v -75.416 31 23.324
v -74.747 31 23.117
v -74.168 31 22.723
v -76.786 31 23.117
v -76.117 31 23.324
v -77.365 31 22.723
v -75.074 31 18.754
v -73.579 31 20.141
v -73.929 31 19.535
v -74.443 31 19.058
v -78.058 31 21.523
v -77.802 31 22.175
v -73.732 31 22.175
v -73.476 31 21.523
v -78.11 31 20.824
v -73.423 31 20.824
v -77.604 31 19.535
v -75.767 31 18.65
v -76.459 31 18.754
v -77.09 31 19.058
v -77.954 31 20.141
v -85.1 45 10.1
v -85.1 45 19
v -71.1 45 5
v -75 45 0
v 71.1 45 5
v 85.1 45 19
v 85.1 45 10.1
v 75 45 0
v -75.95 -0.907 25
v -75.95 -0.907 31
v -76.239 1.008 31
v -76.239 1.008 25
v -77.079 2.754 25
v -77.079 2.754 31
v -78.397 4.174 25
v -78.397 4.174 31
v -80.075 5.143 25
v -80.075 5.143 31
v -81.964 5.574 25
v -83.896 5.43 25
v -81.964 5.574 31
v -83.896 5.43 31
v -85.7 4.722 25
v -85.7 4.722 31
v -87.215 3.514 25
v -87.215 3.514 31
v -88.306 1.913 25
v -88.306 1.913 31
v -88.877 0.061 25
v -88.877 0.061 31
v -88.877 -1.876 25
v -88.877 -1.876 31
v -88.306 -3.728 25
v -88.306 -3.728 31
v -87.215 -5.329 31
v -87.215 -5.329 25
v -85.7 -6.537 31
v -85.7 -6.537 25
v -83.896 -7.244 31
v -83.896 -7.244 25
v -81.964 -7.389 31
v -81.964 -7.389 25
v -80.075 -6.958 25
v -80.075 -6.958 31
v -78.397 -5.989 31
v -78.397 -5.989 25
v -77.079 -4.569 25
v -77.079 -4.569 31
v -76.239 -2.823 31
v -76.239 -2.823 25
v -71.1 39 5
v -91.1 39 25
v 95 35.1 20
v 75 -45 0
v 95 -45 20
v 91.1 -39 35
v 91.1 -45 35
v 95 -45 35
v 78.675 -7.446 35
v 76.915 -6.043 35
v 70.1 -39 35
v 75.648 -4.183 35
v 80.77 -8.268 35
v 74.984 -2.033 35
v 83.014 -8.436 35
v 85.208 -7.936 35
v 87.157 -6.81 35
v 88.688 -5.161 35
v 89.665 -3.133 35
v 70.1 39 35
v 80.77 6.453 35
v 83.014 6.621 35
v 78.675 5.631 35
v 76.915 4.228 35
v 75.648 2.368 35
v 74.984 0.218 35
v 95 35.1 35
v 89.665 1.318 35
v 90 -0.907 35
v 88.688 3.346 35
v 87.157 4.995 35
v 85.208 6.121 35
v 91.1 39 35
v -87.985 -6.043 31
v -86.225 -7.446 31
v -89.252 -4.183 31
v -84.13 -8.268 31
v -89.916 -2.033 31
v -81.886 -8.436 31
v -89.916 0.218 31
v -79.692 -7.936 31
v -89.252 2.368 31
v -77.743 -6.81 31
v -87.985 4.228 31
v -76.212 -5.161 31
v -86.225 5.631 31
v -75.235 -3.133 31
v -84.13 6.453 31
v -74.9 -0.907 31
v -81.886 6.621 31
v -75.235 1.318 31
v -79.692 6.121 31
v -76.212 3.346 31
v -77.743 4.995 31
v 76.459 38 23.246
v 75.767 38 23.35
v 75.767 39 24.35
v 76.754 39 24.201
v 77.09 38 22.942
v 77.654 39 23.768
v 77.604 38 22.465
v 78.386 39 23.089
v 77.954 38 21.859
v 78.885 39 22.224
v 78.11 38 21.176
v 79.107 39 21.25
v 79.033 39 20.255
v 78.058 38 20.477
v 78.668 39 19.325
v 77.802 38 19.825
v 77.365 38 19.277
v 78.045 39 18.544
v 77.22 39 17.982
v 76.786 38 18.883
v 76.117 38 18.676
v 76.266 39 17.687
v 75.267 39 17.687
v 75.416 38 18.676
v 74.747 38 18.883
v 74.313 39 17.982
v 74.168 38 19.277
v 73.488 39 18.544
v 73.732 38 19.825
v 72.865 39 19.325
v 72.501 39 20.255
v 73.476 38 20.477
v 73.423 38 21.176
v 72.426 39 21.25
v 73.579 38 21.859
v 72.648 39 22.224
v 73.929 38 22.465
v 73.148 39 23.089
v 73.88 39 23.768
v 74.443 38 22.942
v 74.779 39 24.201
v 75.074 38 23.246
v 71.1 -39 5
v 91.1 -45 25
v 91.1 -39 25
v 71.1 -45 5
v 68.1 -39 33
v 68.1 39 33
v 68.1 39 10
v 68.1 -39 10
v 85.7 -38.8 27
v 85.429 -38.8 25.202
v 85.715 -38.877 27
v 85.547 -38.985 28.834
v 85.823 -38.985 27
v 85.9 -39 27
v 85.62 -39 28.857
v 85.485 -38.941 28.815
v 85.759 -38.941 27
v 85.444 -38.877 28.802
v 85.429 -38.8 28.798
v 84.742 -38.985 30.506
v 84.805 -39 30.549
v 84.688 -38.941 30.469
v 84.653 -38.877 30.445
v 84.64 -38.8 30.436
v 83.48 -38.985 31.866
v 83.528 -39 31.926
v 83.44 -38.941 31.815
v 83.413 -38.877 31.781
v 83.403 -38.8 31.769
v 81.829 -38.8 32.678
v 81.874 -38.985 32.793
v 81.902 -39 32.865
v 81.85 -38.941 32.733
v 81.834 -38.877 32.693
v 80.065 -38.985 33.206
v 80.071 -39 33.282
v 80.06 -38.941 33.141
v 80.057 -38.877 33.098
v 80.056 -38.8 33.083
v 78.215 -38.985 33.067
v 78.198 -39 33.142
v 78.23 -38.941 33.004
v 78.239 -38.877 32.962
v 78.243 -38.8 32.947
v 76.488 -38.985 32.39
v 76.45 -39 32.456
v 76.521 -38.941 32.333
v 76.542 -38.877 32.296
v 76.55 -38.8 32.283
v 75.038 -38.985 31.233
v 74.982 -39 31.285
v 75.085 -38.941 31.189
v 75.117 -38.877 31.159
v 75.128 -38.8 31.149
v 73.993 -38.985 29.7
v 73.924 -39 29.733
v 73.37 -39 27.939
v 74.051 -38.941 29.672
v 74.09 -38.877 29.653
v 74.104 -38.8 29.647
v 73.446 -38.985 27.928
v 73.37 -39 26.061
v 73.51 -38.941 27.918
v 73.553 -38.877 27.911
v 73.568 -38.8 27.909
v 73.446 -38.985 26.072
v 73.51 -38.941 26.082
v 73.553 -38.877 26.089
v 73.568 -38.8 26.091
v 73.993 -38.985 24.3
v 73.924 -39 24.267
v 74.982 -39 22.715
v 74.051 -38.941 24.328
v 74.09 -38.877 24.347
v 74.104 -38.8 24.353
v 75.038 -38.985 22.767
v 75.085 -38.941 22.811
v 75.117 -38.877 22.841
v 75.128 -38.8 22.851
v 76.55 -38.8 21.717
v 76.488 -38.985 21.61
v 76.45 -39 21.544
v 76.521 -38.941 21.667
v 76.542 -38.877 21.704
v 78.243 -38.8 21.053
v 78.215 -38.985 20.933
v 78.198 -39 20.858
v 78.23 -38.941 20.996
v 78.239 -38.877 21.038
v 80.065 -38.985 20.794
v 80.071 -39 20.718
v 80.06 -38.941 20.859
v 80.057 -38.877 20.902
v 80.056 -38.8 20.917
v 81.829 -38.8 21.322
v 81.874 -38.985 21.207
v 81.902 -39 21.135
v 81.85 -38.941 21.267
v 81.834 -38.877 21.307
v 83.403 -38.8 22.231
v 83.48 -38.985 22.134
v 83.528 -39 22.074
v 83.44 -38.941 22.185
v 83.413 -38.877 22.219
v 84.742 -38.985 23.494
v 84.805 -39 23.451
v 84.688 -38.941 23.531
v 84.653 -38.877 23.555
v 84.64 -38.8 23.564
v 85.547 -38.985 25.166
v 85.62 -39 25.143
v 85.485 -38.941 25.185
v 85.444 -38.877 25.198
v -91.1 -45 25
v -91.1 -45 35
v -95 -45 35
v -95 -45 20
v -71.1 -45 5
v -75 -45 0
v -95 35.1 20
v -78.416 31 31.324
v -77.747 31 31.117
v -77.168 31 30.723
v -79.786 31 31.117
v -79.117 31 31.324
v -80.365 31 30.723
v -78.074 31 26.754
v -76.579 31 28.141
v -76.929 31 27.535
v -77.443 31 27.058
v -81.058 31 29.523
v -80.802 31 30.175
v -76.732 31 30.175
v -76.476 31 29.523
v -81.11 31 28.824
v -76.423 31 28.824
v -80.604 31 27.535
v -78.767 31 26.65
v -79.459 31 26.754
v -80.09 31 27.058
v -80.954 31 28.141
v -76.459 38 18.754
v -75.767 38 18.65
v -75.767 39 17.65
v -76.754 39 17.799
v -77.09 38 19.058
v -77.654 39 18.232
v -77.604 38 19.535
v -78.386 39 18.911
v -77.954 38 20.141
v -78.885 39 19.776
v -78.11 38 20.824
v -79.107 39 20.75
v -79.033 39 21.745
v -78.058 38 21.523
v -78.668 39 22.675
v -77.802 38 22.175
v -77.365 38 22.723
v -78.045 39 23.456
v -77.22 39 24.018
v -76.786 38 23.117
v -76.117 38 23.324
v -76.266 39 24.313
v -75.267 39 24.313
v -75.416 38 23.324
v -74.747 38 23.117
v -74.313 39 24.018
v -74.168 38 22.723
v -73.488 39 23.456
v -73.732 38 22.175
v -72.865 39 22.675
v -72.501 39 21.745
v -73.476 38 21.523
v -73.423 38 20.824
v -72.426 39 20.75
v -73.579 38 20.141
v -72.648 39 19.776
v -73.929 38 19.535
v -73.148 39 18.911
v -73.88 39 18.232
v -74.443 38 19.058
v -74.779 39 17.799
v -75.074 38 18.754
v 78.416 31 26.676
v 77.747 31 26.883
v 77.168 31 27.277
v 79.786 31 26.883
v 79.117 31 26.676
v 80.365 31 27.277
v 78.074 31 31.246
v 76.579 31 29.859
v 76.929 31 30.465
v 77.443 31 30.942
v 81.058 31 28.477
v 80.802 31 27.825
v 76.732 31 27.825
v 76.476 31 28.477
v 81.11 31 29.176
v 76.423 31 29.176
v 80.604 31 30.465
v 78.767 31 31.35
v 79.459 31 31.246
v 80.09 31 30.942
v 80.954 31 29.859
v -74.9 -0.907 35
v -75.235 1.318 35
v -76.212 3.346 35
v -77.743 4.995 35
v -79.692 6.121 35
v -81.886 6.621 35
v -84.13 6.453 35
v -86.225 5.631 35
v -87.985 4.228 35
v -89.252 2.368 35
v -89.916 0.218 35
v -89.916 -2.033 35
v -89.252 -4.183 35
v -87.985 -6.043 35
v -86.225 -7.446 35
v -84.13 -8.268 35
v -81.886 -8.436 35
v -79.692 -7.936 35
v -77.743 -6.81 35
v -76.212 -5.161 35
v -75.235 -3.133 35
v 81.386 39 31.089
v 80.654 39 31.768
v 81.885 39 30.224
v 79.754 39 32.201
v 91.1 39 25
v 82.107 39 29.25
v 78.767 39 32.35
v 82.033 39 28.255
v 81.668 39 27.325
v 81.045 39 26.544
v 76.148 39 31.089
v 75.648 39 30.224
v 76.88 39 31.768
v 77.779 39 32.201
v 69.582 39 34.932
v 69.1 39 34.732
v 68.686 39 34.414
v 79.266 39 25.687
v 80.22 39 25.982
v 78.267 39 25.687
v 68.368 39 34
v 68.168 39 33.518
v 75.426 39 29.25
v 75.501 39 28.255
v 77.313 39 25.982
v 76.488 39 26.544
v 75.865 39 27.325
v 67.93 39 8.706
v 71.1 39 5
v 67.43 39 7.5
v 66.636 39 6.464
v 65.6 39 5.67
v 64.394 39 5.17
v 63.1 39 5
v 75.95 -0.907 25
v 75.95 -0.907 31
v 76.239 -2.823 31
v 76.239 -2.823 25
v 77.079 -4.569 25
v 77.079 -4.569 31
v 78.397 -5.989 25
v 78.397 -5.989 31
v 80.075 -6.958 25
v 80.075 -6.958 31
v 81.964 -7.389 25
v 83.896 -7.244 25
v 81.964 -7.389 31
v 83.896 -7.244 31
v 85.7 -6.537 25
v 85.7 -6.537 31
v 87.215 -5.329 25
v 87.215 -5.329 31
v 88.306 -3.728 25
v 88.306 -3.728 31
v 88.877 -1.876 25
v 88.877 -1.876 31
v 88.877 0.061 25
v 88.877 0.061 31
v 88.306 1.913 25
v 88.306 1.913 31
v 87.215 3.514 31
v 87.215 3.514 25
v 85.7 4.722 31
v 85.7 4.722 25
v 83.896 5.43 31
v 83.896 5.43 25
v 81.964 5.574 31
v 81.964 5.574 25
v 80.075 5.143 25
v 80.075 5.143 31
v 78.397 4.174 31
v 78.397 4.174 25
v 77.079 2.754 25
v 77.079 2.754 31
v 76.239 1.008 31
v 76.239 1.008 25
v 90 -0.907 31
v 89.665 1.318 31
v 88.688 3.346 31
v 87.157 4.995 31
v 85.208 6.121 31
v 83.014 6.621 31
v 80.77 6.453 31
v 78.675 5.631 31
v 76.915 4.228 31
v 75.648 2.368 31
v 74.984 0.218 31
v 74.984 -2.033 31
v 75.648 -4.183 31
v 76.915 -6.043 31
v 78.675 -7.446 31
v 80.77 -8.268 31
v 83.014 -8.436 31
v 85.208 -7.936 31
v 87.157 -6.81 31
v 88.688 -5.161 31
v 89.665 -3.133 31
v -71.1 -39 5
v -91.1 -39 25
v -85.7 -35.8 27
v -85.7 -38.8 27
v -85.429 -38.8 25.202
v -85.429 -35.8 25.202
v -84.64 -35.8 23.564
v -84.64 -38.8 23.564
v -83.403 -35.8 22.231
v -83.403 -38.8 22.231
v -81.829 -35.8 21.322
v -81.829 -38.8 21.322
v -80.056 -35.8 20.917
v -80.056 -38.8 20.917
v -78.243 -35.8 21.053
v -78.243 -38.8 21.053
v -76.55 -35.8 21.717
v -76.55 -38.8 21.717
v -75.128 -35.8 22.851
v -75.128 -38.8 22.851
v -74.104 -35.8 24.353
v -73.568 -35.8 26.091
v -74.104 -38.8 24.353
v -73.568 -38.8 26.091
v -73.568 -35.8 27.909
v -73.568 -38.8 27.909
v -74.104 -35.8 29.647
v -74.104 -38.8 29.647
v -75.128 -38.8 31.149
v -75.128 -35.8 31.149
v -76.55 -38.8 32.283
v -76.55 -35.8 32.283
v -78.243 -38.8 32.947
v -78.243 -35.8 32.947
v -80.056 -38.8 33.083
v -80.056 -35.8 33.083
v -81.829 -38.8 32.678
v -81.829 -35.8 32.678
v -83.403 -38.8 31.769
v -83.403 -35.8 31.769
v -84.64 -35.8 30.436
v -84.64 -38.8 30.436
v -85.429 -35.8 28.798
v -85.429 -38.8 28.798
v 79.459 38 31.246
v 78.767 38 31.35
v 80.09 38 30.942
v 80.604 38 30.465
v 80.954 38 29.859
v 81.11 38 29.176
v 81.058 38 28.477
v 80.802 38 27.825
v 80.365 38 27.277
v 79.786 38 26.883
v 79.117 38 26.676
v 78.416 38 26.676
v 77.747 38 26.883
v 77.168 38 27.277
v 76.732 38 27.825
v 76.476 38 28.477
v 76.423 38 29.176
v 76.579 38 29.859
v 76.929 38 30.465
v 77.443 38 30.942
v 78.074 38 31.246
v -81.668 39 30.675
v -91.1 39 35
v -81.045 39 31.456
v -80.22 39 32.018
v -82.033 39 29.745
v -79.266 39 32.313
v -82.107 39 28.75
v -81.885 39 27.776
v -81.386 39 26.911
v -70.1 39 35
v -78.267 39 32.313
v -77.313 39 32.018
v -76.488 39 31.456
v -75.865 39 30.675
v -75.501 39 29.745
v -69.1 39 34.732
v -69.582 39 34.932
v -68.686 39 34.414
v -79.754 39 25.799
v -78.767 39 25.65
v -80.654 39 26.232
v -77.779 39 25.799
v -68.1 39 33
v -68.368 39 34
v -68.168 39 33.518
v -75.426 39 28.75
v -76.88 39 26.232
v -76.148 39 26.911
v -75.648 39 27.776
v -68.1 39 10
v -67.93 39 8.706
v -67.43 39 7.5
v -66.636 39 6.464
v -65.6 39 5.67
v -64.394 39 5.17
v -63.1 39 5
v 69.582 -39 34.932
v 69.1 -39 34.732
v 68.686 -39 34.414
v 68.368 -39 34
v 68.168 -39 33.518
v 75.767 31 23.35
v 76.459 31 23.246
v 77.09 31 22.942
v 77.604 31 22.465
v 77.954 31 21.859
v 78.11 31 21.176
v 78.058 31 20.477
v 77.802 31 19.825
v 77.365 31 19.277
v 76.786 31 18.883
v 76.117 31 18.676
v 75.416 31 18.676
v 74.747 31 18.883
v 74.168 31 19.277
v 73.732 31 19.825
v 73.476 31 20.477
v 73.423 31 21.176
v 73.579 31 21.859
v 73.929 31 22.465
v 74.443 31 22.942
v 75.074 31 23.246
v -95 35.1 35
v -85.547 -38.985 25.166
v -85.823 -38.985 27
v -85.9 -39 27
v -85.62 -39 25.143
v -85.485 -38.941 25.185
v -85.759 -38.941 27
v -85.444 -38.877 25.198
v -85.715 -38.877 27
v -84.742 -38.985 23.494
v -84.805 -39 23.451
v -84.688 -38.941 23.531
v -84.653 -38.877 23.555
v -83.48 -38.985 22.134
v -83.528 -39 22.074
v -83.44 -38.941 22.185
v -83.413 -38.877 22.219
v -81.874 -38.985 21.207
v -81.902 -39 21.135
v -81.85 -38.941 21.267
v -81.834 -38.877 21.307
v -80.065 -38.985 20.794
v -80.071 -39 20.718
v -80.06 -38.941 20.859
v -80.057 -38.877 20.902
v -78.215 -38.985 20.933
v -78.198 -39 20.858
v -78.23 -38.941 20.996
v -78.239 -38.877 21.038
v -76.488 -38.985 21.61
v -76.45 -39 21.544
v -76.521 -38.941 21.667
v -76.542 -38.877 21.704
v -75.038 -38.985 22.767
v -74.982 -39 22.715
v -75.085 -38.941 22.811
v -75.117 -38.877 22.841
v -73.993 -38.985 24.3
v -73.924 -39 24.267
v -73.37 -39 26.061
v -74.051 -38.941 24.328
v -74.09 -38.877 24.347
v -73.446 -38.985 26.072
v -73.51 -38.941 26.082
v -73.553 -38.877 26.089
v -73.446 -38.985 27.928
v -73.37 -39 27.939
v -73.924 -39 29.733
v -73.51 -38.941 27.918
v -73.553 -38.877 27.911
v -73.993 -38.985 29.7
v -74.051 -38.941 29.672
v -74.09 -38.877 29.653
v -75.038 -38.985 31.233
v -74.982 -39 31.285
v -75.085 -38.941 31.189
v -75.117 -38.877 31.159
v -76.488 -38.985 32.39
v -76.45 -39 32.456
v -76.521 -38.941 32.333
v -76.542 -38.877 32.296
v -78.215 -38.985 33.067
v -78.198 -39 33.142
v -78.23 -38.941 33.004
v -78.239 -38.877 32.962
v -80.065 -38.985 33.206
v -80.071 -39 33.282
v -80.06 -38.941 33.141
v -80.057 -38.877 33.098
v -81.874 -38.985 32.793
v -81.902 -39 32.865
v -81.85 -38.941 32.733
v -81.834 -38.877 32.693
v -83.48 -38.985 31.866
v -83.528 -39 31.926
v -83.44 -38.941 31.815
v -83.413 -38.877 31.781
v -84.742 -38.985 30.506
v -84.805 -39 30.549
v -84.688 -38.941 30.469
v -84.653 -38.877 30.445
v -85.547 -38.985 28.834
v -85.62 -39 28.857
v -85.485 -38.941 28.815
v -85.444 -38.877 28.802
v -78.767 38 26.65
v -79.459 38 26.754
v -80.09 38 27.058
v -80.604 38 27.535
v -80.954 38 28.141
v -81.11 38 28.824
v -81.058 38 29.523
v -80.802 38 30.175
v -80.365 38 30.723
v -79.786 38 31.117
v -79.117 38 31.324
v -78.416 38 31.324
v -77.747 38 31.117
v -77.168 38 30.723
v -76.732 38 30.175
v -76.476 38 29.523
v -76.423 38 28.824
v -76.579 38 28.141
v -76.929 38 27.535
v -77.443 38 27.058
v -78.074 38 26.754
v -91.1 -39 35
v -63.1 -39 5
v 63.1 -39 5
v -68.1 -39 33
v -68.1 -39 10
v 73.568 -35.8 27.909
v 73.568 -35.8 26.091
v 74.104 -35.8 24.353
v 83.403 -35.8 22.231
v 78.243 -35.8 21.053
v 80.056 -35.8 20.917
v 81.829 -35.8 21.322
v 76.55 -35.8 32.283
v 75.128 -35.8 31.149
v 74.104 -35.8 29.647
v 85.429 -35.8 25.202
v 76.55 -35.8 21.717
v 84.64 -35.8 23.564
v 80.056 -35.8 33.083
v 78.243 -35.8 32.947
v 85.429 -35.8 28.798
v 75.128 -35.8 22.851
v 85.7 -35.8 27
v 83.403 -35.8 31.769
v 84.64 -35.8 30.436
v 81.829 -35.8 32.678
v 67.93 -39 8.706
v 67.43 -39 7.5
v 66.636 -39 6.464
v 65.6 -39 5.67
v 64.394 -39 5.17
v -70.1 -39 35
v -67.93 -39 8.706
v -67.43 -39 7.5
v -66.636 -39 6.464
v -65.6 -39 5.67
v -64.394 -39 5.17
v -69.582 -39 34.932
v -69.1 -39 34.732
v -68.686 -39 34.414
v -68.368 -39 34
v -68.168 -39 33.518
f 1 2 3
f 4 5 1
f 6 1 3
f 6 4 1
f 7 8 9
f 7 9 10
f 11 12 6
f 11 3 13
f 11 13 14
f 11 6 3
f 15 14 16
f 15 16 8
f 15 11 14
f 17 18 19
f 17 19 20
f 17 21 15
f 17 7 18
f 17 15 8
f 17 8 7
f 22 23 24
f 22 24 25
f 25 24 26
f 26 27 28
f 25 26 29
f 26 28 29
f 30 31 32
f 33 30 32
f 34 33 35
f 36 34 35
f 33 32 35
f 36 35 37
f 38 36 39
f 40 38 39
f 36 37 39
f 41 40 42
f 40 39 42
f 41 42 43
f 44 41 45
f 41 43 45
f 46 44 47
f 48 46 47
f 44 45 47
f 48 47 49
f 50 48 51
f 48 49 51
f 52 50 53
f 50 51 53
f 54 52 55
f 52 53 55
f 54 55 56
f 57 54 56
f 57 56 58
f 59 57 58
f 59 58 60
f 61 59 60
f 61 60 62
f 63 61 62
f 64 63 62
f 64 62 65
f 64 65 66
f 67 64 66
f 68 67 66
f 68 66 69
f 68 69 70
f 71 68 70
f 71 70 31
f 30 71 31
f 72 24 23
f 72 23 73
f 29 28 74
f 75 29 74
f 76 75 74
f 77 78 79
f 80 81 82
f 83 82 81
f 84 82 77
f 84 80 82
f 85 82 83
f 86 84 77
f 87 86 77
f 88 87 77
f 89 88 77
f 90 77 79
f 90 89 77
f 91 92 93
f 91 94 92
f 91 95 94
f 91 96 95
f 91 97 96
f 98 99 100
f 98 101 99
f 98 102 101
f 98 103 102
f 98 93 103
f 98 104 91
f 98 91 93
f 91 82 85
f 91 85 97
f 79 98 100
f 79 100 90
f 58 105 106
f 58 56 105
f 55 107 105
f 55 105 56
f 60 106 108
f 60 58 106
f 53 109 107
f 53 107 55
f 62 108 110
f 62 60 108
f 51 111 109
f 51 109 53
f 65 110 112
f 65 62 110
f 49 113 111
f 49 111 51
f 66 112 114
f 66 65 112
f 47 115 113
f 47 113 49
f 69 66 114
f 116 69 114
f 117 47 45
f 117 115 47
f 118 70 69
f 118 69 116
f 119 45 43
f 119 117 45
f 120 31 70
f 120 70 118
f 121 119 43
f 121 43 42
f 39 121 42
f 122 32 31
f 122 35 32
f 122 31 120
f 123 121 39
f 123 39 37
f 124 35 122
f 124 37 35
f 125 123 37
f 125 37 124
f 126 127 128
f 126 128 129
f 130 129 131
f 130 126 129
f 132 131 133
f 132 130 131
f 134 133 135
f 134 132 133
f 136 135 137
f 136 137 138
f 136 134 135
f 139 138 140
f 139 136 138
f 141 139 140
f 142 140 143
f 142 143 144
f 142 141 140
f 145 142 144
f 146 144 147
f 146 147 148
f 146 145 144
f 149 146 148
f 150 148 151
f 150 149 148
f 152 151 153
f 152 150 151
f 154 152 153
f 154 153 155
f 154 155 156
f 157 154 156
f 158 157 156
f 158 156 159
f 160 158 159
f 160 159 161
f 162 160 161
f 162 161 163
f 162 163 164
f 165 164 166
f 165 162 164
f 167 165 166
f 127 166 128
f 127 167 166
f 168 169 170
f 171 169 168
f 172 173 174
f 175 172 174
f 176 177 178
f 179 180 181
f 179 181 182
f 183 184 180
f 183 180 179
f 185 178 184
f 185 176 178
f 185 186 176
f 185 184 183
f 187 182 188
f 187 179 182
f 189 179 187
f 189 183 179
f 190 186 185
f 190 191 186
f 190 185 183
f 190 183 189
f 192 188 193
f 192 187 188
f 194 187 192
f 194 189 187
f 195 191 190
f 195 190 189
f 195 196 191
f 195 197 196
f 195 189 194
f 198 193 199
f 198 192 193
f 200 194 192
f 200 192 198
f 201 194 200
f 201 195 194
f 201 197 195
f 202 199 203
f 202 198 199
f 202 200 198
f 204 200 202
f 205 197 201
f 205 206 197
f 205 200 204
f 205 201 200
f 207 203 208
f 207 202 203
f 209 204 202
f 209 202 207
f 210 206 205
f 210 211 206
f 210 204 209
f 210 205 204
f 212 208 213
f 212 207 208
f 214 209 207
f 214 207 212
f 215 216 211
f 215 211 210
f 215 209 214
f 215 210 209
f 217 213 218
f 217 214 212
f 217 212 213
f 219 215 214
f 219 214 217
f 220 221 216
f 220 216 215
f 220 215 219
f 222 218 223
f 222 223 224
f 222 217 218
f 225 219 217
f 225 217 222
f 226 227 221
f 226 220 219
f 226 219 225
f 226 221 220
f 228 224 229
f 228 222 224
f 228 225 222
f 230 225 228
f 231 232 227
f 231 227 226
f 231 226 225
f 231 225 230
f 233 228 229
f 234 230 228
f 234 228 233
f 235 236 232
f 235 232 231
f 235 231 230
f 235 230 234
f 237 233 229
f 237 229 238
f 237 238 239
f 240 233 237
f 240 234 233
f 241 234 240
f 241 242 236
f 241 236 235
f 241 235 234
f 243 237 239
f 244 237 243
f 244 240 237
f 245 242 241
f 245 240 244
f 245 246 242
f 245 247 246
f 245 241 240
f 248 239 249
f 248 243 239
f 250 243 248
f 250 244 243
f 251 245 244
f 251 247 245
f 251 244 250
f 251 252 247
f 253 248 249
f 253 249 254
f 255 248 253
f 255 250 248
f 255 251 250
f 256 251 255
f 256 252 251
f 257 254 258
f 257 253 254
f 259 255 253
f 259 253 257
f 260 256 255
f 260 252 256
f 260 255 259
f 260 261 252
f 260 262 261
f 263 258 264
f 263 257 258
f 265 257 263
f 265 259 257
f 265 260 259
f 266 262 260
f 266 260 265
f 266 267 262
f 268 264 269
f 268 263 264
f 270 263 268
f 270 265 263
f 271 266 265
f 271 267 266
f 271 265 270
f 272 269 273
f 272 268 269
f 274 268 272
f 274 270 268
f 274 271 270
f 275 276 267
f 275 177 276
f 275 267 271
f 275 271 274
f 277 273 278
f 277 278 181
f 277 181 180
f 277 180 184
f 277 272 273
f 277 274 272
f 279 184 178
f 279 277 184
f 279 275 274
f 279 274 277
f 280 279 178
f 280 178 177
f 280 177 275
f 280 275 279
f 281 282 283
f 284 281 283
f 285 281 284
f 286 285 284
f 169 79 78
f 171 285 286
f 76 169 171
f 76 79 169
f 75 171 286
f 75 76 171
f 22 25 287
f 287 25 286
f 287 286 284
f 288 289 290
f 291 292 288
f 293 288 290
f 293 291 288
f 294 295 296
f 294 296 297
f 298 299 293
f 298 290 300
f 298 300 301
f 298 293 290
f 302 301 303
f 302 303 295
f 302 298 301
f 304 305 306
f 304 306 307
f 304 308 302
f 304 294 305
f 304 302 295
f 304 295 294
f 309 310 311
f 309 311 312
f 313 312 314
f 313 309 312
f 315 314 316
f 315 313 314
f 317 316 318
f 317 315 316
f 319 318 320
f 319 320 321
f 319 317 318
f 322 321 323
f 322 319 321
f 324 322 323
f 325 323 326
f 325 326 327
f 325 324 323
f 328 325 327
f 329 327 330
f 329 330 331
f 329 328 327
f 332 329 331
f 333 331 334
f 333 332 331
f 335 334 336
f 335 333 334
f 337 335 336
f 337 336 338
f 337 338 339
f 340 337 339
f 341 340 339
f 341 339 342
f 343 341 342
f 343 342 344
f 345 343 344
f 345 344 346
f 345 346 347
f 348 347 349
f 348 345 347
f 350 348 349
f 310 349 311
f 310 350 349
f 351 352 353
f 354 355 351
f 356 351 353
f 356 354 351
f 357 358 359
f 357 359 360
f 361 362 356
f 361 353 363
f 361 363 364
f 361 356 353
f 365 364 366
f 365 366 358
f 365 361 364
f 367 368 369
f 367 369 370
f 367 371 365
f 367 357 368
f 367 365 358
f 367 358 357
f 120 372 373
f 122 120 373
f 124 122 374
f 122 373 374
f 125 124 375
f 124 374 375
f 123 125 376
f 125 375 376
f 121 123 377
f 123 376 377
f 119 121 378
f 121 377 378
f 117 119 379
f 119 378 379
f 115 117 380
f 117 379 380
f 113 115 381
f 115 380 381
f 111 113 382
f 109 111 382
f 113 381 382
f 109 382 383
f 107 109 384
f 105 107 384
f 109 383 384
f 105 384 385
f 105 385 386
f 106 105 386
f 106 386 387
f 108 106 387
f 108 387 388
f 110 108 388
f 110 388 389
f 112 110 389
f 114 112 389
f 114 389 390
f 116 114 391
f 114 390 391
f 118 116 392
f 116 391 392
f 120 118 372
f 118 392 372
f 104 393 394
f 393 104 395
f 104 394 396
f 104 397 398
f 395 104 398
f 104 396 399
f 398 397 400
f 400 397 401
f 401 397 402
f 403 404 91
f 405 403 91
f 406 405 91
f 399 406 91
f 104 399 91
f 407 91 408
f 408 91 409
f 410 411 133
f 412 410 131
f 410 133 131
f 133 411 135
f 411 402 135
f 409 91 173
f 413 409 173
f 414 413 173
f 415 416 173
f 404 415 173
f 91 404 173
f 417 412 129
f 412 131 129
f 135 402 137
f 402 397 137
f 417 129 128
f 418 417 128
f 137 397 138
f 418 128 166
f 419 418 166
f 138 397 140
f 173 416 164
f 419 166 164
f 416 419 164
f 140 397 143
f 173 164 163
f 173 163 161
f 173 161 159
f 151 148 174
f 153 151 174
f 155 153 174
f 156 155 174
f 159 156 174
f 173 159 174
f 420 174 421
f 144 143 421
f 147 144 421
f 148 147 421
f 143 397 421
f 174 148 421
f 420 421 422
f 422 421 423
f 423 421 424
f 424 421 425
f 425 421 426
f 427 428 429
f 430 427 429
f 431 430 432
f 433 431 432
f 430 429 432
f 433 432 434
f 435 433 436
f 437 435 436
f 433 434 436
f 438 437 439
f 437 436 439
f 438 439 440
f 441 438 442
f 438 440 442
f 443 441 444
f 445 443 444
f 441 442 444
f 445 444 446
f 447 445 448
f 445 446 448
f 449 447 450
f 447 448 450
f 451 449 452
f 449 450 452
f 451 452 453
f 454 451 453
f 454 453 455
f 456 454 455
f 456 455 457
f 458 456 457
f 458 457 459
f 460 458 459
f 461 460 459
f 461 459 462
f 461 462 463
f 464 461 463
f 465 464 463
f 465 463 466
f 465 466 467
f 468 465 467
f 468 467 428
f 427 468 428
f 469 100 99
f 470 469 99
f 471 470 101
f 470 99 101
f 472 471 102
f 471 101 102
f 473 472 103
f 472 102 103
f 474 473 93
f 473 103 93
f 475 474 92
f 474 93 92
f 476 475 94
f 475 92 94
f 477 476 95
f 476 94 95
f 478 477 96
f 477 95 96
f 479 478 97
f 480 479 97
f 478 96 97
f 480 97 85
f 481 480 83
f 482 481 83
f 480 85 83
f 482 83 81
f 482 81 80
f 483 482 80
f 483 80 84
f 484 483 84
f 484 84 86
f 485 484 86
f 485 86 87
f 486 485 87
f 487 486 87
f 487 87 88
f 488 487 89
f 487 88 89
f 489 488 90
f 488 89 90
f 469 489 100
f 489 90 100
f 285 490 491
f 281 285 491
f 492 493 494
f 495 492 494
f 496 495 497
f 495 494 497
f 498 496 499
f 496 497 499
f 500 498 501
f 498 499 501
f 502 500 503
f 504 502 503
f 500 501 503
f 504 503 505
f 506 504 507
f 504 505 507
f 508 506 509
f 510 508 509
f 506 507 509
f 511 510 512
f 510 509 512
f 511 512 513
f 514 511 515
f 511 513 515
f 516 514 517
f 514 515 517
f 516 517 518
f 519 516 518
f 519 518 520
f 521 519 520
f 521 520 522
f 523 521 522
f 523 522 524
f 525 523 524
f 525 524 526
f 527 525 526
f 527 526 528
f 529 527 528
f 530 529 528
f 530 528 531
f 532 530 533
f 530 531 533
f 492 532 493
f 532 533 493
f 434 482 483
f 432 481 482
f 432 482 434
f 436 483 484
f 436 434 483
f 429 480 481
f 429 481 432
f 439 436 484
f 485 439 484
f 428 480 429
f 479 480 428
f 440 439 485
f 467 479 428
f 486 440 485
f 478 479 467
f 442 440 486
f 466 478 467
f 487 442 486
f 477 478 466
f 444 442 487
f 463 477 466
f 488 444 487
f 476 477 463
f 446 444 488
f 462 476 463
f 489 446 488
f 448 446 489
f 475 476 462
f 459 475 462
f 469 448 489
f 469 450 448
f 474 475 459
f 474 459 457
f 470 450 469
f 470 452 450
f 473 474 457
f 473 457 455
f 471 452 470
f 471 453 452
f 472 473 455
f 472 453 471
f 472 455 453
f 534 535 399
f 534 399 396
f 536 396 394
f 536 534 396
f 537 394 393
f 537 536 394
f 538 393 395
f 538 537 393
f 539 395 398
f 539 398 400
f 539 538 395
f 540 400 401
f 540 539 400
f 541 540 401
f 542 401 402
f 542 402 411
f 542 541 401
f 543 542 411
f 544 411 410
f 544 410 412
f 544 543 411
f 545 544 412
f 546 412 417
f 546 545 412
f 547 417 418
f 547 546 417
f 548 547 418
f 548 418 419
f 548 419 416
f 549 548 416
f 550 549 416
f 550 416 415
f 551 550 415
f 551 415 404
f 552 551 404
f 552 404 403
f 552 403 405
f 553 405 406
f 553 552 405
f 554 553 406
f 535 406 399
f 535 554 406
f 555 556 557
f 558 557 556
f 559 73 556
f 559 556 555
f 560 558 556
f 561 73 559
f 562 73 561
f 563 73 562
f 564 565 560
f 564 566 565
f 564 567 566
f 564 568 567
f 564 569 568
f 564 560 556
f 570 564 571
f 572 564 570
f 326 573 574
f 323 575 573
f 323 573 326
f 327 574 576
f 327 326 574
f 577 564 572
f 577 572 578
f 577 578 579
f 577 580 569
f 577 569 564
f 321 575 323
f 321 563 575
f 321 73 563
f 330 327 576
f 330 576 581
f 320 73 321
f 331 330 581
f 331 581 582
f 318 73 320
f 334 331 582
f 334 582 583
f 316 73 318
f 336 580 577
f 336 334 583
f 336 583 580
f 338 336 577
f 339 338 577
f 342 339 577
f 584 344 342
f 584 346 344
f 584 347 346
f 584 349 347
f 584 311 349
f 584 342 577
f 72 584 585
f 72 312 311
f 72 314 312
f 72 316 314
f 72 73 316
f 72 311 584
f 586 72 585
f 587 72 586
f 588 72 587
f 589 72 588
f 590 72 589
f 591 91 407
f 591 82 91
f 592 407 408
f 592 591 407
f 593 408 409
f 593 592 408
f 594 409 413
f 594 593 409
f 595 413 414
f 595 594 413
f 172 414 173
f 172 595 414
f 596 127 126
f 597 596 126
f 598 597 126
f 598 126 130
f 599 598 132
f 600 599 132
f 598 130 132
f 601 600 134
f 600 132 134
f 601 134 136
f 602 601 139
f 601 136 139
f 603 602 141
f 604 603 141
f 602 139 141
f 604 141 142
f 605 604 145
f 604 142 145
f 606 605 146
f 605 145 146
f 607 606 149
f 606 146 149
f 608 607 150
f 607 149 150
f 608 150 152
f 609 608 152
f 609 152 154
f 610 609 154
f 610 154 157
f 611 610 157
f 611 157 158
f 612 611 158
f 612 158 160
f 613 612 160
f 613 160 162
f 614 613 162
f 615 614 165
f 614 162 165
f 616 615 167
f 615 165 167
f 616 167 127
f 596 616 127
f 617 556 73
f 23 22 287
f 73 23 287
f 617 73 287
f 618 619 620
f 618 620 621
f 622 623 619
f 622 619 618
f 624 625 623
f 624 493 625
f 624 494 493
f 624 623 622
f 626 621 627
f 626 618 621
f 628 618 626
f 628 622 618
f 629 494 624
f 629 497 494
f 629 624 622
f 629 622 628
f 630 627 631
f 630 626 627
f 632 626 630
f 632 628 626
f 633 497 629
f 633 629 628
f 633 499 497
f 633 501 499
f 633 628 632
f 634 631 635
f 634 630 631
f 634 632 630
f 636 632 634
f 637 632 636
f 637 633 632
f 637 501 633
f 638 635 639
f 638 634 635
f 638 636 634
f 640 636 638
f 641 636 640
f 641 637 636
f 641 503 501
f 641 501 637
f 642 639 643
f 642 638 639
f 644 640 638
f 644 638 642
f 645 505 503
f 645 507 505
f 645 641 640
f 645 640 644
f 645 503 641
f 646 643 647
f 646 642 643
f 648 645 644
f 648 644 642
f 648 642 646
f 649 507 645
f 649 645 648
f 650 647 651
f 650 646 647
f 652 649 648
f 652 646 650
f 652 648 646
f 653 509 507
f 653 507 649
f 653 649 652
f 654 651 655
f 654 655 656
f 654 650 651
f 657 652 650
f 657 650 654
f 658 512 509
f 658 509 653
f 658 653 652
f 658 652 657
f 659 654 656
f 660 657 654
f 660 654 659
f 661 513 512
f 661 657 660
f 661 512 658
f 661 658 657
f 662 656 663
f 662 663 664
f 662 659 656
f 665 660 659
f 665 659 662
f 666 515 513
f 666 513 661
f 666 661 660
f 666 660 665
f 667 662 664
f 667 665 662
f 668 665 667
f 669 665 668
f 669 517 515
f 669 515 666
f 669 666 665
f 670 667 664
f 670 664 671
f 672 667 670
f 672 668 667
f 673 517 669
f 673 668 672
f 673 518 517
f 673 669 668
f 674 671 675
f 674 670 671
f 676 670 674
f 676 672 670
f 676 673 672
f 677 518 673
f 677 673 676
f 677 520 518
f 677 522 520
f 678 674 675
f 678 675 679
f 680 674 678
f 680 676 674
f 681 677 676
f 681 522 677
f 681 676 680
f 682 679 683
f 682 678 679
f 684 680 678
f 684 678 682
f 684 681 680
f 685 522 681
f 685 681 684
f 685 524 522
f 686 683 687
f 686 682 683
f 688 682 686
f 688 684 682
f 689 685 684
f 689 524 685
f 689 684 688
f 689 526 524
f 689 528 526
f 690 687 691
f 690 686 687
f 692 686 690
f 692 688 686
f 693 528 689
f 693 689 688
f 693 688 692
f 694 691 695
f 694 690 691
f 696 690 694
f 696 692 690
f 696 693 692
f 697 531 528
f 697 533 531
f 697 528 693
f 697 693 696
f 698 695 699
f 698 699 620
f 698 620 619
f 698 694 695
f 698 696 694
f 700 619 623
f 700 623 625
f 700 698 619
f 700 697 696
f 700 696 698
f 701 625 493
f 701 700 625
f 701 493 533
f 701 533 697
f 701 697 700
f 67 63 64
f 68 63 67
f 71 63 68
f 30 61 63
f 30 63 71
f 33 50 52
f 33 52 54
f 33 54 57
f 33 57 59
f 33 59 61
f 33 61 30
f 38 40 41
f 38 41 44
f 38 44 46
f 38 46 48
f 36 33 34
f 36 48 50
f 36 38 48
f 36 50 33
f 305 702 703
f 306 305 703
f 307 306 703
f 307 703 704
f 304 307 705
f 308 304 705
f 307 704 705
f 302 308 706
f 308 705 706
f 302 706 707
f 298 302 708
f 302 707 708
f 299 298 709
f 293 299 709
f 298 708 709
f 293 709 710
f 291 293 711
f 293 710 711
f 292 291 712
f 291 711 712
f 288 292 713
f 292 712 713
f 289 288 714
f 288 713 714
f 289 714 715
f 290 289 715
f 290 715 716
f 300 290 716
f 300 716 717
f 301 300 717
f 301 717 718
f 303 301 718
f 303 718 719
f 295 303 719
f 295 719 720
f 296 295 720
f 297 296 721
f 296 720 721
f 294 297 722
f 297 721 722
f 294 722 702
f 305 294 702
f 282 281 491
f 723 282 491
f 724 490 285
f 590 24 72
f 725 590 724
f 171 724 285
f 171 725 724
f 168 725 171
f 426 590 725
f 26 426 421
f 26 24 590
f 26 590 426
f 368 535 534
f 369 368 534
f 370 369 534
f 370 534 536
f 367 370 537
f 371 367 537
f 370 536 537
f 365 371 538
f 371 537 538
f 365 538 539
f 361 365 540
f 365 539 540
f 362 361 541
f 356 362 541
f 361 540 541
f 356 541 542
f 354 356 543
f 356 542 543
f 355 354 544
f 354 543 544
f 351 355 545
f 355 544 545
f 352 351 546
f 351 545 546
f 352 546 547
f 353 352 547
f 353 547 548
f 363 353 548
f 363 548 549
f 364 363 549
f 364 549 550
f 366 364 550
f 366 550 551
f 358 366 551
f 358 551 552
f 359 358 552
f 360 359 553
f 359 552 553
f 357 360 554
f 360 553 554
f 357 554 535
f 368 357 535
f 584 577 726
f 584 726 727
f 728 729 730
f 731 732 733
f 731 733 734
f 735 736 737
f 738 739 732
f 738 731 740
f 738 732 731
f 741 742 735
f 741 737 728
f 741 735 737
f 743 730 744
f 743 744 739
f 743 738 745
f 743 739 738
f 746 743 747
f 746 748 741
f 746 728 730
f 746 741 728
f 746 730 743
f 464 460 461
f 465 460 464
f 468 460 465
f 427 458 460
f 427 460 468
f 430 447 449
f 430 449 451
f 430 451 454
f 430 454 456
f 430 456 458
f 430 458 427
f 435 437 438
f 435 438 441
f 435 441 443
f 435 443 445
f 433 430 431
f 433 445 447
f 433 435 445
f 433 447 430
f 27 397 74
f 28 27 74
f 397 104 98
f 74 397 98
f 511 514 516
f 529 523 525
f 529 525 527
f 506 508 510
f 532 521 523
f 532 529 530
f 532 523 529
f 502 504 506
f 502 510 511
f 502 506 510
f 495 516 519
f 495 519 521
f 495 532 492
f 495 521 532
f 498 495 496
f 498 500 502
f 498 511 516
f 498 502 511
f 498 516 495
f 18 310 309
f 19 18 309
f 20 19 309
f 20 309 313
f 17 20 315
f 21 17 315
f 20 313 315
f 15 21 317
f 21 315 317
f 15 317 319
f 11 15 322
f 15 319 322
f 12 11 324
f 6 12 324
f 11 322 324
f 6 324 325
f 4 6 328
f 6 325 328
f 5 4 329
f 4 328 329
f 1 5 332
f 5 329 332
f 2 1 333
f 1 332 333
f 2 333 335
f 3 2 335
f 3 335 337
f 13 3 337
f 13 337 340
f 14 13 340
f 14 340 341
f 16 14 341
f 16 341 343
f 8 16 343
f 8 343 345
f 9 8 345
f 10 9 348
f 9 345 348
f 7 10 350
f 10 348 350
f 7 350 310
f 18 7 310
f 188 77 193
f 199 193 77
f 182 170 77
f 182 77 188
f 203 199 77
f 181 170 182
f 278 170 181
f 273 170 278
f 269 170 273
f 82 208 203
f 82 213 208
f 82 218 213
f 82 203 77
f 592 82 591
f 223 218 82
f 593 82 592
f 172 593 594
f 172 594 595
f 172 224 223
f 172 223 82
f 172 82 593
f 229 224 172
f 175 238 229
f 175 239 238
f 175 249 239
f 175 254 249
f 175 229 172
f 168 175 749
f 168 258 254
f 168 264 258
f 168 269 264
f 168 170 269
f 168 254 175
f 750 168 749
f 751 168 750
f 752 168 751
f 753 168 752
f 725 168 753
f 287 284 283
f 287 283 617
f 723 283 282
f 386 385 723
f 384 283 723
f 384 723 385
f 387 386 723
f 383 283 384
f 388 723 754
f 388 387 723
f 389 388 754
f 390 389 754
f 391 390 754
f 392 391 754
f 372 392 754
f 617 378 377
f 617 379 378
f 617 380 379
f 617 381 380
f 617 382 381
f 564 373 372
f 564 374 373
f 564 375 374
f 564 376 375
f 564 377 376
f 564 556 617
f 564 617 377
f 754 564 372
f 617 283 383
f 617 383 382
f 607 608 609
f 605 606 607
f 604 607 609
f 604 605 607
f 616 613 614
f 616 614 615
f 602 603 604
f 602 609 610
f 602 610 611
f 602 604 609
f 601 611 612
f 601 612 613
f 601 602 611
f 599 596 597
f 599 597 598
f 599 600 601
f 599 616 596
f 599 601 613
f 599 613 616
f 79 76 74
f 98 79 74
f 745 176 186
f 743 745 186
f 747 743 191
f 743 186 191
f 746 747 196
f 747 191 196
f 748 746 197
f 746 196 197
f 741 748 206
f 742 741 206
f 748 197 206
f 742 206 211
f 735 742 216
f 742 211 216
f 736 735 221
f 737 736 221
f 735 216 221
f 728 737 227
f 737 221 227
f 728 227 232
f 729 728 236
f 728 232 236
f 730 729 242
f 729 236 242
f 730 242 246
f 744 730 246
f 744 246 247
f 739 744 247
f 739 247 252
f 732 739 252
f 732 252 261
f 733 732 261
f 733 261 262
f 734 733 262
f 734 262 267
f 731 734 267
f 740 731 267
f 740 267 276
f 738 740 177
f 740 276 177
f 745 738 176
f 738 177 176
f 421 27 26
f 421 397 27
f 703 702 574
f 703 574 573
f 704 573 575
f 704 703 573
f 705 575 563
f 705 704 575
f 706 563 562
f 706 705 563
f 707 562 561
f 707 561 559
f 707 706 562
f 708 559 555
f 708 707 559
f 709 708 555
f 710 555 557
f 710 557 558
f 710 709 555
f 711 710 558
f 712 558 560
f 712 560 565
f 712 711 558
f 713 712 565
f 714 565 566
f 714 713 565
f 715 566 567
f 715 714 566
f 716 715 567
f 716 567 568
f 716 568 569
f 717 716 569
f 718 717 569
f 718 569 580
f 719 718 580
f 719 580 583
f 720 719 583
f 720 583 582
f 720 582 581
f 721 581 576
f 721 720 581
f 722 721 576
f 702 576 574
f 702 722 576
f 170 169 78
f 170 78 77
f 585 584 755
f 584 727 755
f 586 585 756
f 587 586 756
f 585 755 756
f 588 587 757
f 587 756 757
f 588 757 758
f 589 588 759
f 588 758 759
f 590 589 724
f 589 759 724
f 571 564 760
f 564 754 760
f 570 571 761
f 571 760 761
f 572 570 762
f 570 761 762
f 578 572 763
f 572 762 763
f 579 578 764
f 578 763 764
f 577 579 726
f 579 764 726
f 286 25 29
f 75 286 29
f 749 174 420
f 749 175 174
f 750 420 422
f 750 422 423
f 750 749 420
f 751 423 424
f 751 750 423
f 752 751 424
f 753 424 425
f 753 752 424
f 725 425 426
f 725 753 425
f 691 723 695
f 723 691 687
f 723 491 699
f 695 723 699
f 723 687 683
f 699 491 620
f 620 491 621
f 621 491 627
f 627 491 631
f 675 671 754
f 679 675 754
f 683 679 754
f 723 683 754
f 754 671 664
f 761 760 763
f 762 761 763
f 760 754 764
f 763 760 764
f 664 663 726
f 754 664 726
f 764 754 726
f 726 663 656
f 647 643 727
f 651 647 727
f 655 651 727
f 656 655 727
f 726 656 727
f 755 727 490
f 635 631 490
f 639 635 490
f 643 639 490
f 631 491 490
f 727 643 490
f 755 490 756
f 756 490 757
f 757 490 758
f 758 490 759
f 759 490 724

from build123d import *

# Parameters (mm, degrees)
SKETCH1_W                      = 190
SKETCH1_H                      = 90
BOSS_EXTRUDE1_DEPTH            = 5
SKETCH2_W                      = 3.9
SKETCH2_H                      = 90
BOSS_EXTRUDE2_DEPTH            = 30
SKETCH3_W                      = 34
SKETCH3_H                      = 5
SKETCH3_W_2                    = 47
BOSS_EXTRUDE3_DEPTH            = 90
SKETCH4_W                      = 182.2
SKETCH4_H                      = 6
CUT_EXTRUDE1_DEPTH             = 5
CHAMFER6_SIZE                  = 20
BOSS_EXTRUDE4_DEPTH            = 78
FILLET5_R                      = 2
SKETCH9_R                      = 6.5
CUT_EXTRUDE4_DEPTH             = 10
SKETCH10_R                     = 7.55
CUT_EXTRUDE5_DEPTH             = 4
SKETCH15_R                     = 2.35
CUT_EXTRUDE7_DEPTH             = 8
CHAMFER7_SIZE                  = 1
SKETCH17_R                     = 6.1
CUT_EXTRUDE8_DEPTH             = 3.2
FILLET7_R                      = 0.2
CHAMFER8_SIZE                  = 9.9
CUT_EXTRUDE9_REACH             = 164.433
SKETCH18_W                     = 5
SKETCH18_H                     = 78
CUT_EXTRUDE9_DIRECTION_2_REACH = 164.433
BOSS_EXTRUDE5_DEPTH            = 78
FILLET8_R                      = 5


with BuildPart() as part:
    # Sketch1 → Boss-Extrude1 (new body)
    with BuildSketch(Plane.XY):
        Rectangle(SKETCH1_W, SKETCH1_H)
    extrude(amount=BOSS_EXTRUDE1_DEPTH)

    # Sketch2 → Boss-Extrude2 (add)
    with BuildSketch(Plane.XY.offset(5)):
        with Locations((-93.05, 0)):
            Rectangle(SKETCH2_W, SKETCH2_H)
        with Locations((93.05, 0)):
            Rectangle(SKETCH2_W, SKETCH2_H)
    extrude(amount=BOSS_EXTRUDE2_DEPTH)

    # Sketch3 → Boss-Extrude3 (add)
    with BuildSketch(Plane(origin=(0, 45, 0), x_dir=(1, 0, 0), z_dir=(0, 1, 0))):
        with Locations((-74.1, -16.5)):
            Rectangle(SKETCH3_W, SKETCH3_H)
        with Locations((67.6, -16.5)):
            Rectangle(SKETCH3_W_2, SKETCH3_H)
    extrude(amount=-BOSS_EXTRUDE3_DEPTH)

    # Sketch4 → Cut-Extrude1 (cut)
    with BuildSketch(Plane.XY.offset(19)):
        with Locations((0, 42)):
            Rectangle(SKETCH4_W, SKETCH4_H)
        with Locations((0, -42)):
            Rectangle(SKETCH4_W, SKETCH4_H)
    extrude(amount=-CUT_EXTRUDE1_DEPTH, mode=Mode.SUBTRACT)

    # Chamfer6
    # the kernel refuses this chamfer: 20 mm, written as the material it adds along each edge
    with BuildSketch(Plane(origin=(-91.1, 45, 5), x_dir=(0.9996219169112968, 0, -0.02749587661058636), z_dir=(0, -1, 0))) as chamfer6_piece_1:
        Polygon((CHAMFER6_SIZE * 0.999621916911, CHAMFER6_SIZE * 0.0274958766106), (-CHAMFER6_SIZE * 0.0274958766106, CHAMFER6_SIZE * 0.999621916911), (0, 0), align=None)
    extrude(amount=90)
    with BuildSketch(Plane(origin=(91.1, -45, 5), x_dir=(0.027495876610586317, 0, 0.9996219169112968), z_dir=(0, 1, 0))) as chamfer6_piece_2:
        Polygon((CHAMFER6_SIZE * 0.999621916911, -CHAMFER6_SIZE * 0.0274958766106), (-CHAMFER6_SIZE * 0.0274958766106, -CHAMFER6_SIZE * 0.999621916911), (0, 0), align=None)
    extrude(amount=90)
    # the kernel refuses this chamfer: 20 mm, written as the material it takes off along each edge
    with BuildSketch(Plane(origin=(-95, -96.433659759, 0), x_dir=(0.9996219169112968, 0, -0.027495876610586372), z_dir=(0, 1, 0)), Plane(origin=(95, 96.433659759, 0), x_dir=(-0.9996219169112968, 0, -0.027495876610586372), z_dir=(0, -1, 0))) as chamfer6_2_piece_1:
        Polygon((CHAMFER6_SIZE * 0.999621916911, -CHAMFER6_SIZE * 0.0274958766106), (-CHAMFER6_SIZE * 0.0274958766106, -CHAMFER6_SIZE * 0.999621916911), (0, 0), align=None)
    extrude(amount=192.867319519, mode=Mode.SUBTRACT)

    # Sketch7 → Boss-Extrude4 (add)
    with BuildSketch(Plane(origin=(0, 39, 0), x_dir=(1, 0, 0), z_dir=(0, 1, 0))):
        Polygon((-85.1, -19), (-91.1, -25), (-91.1, -35), (-68.1, -35), (-68.1, -19), align=None)
        Polygon((68.1, -35), (68.1, -19), (85.1, -19), (91.1, -25), (91.1, -35), align=None)
    extrude(amount=-BOSS_EXTRUDE4_DEPTH)

    # Fillet5
    fillet5_edges = [part.edges().sort_by_distance(p)[0] for p in [
        (-68.1, 0, 35),
        (68.1, 0, 35),
    ]]
    fillet(fillet5_edges, radius=FILLET5_R)

    # Sketch9 → Cut-Extrude4 (cut)
    with BuildSketch(Plane.XY.offset(35)):
        with Locations((-82.45, -0.90743758)):
            Circle(SKETCH9_R)
        with Locations(Location((82.45, -0.90743758, 0), (0, 0, 180))):
            Circle(SKETCH9_R)
    extrude(amount=-CUT_EXTRUDE4_DEPTH, mode=Mode.SUBTRACT)

    # Sketch10 → Cut-Extrude5 (cut)
    with BuildSketch(Plane.XY.offset(35)):
        with Locations((-82.45, -0.90743758)):
            Circle(SKETCH10_R)
        with Locations((82.45, -0.90743758)):
            Circle(SKETCH10_R)
    extrude(amount=-CUT_EXTRUDE5_DEPTH, mode=Mode.SUBTRACT)

    # Sketch15 → Cut-Extrude7 (cut)
    with BuildSketch(Plane(origin=(0, 39, 0), x_dir=(1, 0, 0), z_dir=(0, 1, 0))):
        with Locations(Location((75.766666667, -21, 0), (0, 0, 270))):
            Circle(SKETCH15_R)
        with Locations(Location((-75.766666667, -21, 0), (0, 0, 90))):
            Circle(SKETCH15_R)
        with Locations(Location((78.766666667, -29, 0), (0, 0, 270))):
            Circle(SKETCH15_R)
        with Locations(Location((-78.766666667, -29, 0), (0, 0, 90))):
            Circle(SKETCH15_R)
    extrude(amount=-CUT_EXTRUDE7_DEPTH, mode=Mode.SUBTRACT)

    # Chamfer7
    chamfer7_edges = [part.edges().sort_by_distance(p)[0] for p in [
        (-75.766666667, 39, 23.35),
        (78.766666667, 39, 26.65),
        (-78.766666667, 39, 31.35),
        (75.766666667, 39, 18.65),
    ]]
    chamfer(chamfer7_edges, length=CHAMFER7_SIZE)

    # Sketch17 → Cut-Extrude8 (cut)
    with BuildSketch(Plane.XZ.offset(39)):
        with Locations((79.6, 27)):
            Circle(SKETCH17_R)
        with Locations(Location((-79.6, 27, 0), (0, 0, 180))):
            Circle(SKETCH17_R)
    extrude(amount=-CUT_EXTRUDE8_DEPTH, mode=Mode.SUBTRACT)

    # Fillet7
    fillet7_edges = [part.edges().sort_by_distance(p)[0] for p in [
        (73.5, -39, 27),
        (-73.5, -39, 27),
    ]]
    fillet(fillet7_edges, radius=FILLET7_R)

    # Chamfer8
    # the kernel refuses this chamfer: 9.9 mm, written as the material it takes off along each edge
    with BuildSketch(Plane(origin=(-95, 45, -5.459661581), x_dir=(0.9996219169112968, 0.027495876610586265, 0), z_dir=(0, 0, 1)), Plane(origin=(95, 45, 60.459661581), x_dir=(-0.9996219169112968, 0.02749587661058615, 0), z_dir=(0, 0, -1))) as chamfer8_piece_1:
        Polygon((CHAMFER8_SIZE * 0.999621916911, -CHAMFER8_SIZE * 0.0274958766106), (-CHAMFER8_SIZE * 0.0274958766106, -CHAMFER8_SIZE * 0.999621916911), (0, 0), align=None)
    extrude(amount=65.919323162, mode=Mode.SUBTRACT)

    # Cut-Extrude9: up to this face of the body (flat: up to its plane)
    cut_extrude9_end = Plane(part.part.faces().sort_by_distance((-68.1, 0, 26))[0])
    # Sketch18 → Cut-Extrude9 (cut, up to the picked face)
    with BuildSketch(Plane(origin=(-57.1, 0, 0), x_dir=(0, 0, -1), z_dir=(1, 0, 0)), mode=Mode.PRIVATE) as cut_extrude9_sk1:
        with Locations((-16.5, 0)):
            Rectangle(SKETCH18_W, SKETCH18_H)
    cut_extrude9_tool1 = split(extrude(cut_extrude9_sk1.sketch, amount=-CUT_EXTRUDE9_REACH, mode=Mode.PRIVATE), bisect_by=cut_extrude9_end, keep=Keep.BOTH, mode=Mode.PRIVATE)
    add(cut_extrude9_tool1.solids().sort_by(Axis((-57.1, 0, 16.5), (-1, 0, 0)))[0], mode=Mode.SUBTRACT)

    # Cut-Extrude9 direction 2: up to this face of the body (flat: up to its plane)
    cut_extrude9_direction_2_end = Plane(part.part.faces().sort_by_distance((68.1, 0, 26))[0])
    # Sketch18 → Cut-Extrude9 direction 2 (cut, up to the picked face)
    with BuildSketch(Plane(origin=(-57.1, 0, 0), x_dir=(0, 0, -1), z_dir=(1, 0, 0)), mode=Mode.PRIVATE) as cut_extrude9_direction_2_sk1:
        with Locations((-16.5, 0)):
            Rectangle(SKETCH18_W, SKETCH18_H)
    cut_extrude9_direction_2_tool1 = split(extrude(cut_extrude9_direction_2_sk1.sketch, amount=CUT_EXTRUDE9_DIRECTION_2_REACH, mode=Mode.PRIVATE), bisect_by=cut_extrude9_direction_2_end, keep=Keep.BOTH, mode=Mode.PRIVATE)
    add(cut_extrude9_direction_2_tool1.solids().sort_by(Axis((-57.1, 0, 16.5), (1, 0, 0)))[0], mode=Mode.SUBTRACT)

    # Sketch20 → Boss-Extrude5 (add)
    with BuildSketch(Plane(origin=(0, 39, 0), x_dir=(1, 0, 0), z_dir=(0, 1, 0))):
        Polygon((-68.1, -14), (-68.1, -5), (-71.1, -5), (-80.1, -14), align=None)
        Polygon((71.1, -5), (80.1, -14), (68.1, -14), (68.1, -5), align=None)
    extrude(amount=-BOSS_EXTRUDE5_DEPTH)

    # Fillet8
    fillet8_edges = [part.edges().sort_by_distance(p)[0] for p in [
        (-68.1, 0, 5),
        (68.1, 0, 5),
    ]]
    fillet(fillet8_edges, radius=FILLET8_R)


solid = part.part
